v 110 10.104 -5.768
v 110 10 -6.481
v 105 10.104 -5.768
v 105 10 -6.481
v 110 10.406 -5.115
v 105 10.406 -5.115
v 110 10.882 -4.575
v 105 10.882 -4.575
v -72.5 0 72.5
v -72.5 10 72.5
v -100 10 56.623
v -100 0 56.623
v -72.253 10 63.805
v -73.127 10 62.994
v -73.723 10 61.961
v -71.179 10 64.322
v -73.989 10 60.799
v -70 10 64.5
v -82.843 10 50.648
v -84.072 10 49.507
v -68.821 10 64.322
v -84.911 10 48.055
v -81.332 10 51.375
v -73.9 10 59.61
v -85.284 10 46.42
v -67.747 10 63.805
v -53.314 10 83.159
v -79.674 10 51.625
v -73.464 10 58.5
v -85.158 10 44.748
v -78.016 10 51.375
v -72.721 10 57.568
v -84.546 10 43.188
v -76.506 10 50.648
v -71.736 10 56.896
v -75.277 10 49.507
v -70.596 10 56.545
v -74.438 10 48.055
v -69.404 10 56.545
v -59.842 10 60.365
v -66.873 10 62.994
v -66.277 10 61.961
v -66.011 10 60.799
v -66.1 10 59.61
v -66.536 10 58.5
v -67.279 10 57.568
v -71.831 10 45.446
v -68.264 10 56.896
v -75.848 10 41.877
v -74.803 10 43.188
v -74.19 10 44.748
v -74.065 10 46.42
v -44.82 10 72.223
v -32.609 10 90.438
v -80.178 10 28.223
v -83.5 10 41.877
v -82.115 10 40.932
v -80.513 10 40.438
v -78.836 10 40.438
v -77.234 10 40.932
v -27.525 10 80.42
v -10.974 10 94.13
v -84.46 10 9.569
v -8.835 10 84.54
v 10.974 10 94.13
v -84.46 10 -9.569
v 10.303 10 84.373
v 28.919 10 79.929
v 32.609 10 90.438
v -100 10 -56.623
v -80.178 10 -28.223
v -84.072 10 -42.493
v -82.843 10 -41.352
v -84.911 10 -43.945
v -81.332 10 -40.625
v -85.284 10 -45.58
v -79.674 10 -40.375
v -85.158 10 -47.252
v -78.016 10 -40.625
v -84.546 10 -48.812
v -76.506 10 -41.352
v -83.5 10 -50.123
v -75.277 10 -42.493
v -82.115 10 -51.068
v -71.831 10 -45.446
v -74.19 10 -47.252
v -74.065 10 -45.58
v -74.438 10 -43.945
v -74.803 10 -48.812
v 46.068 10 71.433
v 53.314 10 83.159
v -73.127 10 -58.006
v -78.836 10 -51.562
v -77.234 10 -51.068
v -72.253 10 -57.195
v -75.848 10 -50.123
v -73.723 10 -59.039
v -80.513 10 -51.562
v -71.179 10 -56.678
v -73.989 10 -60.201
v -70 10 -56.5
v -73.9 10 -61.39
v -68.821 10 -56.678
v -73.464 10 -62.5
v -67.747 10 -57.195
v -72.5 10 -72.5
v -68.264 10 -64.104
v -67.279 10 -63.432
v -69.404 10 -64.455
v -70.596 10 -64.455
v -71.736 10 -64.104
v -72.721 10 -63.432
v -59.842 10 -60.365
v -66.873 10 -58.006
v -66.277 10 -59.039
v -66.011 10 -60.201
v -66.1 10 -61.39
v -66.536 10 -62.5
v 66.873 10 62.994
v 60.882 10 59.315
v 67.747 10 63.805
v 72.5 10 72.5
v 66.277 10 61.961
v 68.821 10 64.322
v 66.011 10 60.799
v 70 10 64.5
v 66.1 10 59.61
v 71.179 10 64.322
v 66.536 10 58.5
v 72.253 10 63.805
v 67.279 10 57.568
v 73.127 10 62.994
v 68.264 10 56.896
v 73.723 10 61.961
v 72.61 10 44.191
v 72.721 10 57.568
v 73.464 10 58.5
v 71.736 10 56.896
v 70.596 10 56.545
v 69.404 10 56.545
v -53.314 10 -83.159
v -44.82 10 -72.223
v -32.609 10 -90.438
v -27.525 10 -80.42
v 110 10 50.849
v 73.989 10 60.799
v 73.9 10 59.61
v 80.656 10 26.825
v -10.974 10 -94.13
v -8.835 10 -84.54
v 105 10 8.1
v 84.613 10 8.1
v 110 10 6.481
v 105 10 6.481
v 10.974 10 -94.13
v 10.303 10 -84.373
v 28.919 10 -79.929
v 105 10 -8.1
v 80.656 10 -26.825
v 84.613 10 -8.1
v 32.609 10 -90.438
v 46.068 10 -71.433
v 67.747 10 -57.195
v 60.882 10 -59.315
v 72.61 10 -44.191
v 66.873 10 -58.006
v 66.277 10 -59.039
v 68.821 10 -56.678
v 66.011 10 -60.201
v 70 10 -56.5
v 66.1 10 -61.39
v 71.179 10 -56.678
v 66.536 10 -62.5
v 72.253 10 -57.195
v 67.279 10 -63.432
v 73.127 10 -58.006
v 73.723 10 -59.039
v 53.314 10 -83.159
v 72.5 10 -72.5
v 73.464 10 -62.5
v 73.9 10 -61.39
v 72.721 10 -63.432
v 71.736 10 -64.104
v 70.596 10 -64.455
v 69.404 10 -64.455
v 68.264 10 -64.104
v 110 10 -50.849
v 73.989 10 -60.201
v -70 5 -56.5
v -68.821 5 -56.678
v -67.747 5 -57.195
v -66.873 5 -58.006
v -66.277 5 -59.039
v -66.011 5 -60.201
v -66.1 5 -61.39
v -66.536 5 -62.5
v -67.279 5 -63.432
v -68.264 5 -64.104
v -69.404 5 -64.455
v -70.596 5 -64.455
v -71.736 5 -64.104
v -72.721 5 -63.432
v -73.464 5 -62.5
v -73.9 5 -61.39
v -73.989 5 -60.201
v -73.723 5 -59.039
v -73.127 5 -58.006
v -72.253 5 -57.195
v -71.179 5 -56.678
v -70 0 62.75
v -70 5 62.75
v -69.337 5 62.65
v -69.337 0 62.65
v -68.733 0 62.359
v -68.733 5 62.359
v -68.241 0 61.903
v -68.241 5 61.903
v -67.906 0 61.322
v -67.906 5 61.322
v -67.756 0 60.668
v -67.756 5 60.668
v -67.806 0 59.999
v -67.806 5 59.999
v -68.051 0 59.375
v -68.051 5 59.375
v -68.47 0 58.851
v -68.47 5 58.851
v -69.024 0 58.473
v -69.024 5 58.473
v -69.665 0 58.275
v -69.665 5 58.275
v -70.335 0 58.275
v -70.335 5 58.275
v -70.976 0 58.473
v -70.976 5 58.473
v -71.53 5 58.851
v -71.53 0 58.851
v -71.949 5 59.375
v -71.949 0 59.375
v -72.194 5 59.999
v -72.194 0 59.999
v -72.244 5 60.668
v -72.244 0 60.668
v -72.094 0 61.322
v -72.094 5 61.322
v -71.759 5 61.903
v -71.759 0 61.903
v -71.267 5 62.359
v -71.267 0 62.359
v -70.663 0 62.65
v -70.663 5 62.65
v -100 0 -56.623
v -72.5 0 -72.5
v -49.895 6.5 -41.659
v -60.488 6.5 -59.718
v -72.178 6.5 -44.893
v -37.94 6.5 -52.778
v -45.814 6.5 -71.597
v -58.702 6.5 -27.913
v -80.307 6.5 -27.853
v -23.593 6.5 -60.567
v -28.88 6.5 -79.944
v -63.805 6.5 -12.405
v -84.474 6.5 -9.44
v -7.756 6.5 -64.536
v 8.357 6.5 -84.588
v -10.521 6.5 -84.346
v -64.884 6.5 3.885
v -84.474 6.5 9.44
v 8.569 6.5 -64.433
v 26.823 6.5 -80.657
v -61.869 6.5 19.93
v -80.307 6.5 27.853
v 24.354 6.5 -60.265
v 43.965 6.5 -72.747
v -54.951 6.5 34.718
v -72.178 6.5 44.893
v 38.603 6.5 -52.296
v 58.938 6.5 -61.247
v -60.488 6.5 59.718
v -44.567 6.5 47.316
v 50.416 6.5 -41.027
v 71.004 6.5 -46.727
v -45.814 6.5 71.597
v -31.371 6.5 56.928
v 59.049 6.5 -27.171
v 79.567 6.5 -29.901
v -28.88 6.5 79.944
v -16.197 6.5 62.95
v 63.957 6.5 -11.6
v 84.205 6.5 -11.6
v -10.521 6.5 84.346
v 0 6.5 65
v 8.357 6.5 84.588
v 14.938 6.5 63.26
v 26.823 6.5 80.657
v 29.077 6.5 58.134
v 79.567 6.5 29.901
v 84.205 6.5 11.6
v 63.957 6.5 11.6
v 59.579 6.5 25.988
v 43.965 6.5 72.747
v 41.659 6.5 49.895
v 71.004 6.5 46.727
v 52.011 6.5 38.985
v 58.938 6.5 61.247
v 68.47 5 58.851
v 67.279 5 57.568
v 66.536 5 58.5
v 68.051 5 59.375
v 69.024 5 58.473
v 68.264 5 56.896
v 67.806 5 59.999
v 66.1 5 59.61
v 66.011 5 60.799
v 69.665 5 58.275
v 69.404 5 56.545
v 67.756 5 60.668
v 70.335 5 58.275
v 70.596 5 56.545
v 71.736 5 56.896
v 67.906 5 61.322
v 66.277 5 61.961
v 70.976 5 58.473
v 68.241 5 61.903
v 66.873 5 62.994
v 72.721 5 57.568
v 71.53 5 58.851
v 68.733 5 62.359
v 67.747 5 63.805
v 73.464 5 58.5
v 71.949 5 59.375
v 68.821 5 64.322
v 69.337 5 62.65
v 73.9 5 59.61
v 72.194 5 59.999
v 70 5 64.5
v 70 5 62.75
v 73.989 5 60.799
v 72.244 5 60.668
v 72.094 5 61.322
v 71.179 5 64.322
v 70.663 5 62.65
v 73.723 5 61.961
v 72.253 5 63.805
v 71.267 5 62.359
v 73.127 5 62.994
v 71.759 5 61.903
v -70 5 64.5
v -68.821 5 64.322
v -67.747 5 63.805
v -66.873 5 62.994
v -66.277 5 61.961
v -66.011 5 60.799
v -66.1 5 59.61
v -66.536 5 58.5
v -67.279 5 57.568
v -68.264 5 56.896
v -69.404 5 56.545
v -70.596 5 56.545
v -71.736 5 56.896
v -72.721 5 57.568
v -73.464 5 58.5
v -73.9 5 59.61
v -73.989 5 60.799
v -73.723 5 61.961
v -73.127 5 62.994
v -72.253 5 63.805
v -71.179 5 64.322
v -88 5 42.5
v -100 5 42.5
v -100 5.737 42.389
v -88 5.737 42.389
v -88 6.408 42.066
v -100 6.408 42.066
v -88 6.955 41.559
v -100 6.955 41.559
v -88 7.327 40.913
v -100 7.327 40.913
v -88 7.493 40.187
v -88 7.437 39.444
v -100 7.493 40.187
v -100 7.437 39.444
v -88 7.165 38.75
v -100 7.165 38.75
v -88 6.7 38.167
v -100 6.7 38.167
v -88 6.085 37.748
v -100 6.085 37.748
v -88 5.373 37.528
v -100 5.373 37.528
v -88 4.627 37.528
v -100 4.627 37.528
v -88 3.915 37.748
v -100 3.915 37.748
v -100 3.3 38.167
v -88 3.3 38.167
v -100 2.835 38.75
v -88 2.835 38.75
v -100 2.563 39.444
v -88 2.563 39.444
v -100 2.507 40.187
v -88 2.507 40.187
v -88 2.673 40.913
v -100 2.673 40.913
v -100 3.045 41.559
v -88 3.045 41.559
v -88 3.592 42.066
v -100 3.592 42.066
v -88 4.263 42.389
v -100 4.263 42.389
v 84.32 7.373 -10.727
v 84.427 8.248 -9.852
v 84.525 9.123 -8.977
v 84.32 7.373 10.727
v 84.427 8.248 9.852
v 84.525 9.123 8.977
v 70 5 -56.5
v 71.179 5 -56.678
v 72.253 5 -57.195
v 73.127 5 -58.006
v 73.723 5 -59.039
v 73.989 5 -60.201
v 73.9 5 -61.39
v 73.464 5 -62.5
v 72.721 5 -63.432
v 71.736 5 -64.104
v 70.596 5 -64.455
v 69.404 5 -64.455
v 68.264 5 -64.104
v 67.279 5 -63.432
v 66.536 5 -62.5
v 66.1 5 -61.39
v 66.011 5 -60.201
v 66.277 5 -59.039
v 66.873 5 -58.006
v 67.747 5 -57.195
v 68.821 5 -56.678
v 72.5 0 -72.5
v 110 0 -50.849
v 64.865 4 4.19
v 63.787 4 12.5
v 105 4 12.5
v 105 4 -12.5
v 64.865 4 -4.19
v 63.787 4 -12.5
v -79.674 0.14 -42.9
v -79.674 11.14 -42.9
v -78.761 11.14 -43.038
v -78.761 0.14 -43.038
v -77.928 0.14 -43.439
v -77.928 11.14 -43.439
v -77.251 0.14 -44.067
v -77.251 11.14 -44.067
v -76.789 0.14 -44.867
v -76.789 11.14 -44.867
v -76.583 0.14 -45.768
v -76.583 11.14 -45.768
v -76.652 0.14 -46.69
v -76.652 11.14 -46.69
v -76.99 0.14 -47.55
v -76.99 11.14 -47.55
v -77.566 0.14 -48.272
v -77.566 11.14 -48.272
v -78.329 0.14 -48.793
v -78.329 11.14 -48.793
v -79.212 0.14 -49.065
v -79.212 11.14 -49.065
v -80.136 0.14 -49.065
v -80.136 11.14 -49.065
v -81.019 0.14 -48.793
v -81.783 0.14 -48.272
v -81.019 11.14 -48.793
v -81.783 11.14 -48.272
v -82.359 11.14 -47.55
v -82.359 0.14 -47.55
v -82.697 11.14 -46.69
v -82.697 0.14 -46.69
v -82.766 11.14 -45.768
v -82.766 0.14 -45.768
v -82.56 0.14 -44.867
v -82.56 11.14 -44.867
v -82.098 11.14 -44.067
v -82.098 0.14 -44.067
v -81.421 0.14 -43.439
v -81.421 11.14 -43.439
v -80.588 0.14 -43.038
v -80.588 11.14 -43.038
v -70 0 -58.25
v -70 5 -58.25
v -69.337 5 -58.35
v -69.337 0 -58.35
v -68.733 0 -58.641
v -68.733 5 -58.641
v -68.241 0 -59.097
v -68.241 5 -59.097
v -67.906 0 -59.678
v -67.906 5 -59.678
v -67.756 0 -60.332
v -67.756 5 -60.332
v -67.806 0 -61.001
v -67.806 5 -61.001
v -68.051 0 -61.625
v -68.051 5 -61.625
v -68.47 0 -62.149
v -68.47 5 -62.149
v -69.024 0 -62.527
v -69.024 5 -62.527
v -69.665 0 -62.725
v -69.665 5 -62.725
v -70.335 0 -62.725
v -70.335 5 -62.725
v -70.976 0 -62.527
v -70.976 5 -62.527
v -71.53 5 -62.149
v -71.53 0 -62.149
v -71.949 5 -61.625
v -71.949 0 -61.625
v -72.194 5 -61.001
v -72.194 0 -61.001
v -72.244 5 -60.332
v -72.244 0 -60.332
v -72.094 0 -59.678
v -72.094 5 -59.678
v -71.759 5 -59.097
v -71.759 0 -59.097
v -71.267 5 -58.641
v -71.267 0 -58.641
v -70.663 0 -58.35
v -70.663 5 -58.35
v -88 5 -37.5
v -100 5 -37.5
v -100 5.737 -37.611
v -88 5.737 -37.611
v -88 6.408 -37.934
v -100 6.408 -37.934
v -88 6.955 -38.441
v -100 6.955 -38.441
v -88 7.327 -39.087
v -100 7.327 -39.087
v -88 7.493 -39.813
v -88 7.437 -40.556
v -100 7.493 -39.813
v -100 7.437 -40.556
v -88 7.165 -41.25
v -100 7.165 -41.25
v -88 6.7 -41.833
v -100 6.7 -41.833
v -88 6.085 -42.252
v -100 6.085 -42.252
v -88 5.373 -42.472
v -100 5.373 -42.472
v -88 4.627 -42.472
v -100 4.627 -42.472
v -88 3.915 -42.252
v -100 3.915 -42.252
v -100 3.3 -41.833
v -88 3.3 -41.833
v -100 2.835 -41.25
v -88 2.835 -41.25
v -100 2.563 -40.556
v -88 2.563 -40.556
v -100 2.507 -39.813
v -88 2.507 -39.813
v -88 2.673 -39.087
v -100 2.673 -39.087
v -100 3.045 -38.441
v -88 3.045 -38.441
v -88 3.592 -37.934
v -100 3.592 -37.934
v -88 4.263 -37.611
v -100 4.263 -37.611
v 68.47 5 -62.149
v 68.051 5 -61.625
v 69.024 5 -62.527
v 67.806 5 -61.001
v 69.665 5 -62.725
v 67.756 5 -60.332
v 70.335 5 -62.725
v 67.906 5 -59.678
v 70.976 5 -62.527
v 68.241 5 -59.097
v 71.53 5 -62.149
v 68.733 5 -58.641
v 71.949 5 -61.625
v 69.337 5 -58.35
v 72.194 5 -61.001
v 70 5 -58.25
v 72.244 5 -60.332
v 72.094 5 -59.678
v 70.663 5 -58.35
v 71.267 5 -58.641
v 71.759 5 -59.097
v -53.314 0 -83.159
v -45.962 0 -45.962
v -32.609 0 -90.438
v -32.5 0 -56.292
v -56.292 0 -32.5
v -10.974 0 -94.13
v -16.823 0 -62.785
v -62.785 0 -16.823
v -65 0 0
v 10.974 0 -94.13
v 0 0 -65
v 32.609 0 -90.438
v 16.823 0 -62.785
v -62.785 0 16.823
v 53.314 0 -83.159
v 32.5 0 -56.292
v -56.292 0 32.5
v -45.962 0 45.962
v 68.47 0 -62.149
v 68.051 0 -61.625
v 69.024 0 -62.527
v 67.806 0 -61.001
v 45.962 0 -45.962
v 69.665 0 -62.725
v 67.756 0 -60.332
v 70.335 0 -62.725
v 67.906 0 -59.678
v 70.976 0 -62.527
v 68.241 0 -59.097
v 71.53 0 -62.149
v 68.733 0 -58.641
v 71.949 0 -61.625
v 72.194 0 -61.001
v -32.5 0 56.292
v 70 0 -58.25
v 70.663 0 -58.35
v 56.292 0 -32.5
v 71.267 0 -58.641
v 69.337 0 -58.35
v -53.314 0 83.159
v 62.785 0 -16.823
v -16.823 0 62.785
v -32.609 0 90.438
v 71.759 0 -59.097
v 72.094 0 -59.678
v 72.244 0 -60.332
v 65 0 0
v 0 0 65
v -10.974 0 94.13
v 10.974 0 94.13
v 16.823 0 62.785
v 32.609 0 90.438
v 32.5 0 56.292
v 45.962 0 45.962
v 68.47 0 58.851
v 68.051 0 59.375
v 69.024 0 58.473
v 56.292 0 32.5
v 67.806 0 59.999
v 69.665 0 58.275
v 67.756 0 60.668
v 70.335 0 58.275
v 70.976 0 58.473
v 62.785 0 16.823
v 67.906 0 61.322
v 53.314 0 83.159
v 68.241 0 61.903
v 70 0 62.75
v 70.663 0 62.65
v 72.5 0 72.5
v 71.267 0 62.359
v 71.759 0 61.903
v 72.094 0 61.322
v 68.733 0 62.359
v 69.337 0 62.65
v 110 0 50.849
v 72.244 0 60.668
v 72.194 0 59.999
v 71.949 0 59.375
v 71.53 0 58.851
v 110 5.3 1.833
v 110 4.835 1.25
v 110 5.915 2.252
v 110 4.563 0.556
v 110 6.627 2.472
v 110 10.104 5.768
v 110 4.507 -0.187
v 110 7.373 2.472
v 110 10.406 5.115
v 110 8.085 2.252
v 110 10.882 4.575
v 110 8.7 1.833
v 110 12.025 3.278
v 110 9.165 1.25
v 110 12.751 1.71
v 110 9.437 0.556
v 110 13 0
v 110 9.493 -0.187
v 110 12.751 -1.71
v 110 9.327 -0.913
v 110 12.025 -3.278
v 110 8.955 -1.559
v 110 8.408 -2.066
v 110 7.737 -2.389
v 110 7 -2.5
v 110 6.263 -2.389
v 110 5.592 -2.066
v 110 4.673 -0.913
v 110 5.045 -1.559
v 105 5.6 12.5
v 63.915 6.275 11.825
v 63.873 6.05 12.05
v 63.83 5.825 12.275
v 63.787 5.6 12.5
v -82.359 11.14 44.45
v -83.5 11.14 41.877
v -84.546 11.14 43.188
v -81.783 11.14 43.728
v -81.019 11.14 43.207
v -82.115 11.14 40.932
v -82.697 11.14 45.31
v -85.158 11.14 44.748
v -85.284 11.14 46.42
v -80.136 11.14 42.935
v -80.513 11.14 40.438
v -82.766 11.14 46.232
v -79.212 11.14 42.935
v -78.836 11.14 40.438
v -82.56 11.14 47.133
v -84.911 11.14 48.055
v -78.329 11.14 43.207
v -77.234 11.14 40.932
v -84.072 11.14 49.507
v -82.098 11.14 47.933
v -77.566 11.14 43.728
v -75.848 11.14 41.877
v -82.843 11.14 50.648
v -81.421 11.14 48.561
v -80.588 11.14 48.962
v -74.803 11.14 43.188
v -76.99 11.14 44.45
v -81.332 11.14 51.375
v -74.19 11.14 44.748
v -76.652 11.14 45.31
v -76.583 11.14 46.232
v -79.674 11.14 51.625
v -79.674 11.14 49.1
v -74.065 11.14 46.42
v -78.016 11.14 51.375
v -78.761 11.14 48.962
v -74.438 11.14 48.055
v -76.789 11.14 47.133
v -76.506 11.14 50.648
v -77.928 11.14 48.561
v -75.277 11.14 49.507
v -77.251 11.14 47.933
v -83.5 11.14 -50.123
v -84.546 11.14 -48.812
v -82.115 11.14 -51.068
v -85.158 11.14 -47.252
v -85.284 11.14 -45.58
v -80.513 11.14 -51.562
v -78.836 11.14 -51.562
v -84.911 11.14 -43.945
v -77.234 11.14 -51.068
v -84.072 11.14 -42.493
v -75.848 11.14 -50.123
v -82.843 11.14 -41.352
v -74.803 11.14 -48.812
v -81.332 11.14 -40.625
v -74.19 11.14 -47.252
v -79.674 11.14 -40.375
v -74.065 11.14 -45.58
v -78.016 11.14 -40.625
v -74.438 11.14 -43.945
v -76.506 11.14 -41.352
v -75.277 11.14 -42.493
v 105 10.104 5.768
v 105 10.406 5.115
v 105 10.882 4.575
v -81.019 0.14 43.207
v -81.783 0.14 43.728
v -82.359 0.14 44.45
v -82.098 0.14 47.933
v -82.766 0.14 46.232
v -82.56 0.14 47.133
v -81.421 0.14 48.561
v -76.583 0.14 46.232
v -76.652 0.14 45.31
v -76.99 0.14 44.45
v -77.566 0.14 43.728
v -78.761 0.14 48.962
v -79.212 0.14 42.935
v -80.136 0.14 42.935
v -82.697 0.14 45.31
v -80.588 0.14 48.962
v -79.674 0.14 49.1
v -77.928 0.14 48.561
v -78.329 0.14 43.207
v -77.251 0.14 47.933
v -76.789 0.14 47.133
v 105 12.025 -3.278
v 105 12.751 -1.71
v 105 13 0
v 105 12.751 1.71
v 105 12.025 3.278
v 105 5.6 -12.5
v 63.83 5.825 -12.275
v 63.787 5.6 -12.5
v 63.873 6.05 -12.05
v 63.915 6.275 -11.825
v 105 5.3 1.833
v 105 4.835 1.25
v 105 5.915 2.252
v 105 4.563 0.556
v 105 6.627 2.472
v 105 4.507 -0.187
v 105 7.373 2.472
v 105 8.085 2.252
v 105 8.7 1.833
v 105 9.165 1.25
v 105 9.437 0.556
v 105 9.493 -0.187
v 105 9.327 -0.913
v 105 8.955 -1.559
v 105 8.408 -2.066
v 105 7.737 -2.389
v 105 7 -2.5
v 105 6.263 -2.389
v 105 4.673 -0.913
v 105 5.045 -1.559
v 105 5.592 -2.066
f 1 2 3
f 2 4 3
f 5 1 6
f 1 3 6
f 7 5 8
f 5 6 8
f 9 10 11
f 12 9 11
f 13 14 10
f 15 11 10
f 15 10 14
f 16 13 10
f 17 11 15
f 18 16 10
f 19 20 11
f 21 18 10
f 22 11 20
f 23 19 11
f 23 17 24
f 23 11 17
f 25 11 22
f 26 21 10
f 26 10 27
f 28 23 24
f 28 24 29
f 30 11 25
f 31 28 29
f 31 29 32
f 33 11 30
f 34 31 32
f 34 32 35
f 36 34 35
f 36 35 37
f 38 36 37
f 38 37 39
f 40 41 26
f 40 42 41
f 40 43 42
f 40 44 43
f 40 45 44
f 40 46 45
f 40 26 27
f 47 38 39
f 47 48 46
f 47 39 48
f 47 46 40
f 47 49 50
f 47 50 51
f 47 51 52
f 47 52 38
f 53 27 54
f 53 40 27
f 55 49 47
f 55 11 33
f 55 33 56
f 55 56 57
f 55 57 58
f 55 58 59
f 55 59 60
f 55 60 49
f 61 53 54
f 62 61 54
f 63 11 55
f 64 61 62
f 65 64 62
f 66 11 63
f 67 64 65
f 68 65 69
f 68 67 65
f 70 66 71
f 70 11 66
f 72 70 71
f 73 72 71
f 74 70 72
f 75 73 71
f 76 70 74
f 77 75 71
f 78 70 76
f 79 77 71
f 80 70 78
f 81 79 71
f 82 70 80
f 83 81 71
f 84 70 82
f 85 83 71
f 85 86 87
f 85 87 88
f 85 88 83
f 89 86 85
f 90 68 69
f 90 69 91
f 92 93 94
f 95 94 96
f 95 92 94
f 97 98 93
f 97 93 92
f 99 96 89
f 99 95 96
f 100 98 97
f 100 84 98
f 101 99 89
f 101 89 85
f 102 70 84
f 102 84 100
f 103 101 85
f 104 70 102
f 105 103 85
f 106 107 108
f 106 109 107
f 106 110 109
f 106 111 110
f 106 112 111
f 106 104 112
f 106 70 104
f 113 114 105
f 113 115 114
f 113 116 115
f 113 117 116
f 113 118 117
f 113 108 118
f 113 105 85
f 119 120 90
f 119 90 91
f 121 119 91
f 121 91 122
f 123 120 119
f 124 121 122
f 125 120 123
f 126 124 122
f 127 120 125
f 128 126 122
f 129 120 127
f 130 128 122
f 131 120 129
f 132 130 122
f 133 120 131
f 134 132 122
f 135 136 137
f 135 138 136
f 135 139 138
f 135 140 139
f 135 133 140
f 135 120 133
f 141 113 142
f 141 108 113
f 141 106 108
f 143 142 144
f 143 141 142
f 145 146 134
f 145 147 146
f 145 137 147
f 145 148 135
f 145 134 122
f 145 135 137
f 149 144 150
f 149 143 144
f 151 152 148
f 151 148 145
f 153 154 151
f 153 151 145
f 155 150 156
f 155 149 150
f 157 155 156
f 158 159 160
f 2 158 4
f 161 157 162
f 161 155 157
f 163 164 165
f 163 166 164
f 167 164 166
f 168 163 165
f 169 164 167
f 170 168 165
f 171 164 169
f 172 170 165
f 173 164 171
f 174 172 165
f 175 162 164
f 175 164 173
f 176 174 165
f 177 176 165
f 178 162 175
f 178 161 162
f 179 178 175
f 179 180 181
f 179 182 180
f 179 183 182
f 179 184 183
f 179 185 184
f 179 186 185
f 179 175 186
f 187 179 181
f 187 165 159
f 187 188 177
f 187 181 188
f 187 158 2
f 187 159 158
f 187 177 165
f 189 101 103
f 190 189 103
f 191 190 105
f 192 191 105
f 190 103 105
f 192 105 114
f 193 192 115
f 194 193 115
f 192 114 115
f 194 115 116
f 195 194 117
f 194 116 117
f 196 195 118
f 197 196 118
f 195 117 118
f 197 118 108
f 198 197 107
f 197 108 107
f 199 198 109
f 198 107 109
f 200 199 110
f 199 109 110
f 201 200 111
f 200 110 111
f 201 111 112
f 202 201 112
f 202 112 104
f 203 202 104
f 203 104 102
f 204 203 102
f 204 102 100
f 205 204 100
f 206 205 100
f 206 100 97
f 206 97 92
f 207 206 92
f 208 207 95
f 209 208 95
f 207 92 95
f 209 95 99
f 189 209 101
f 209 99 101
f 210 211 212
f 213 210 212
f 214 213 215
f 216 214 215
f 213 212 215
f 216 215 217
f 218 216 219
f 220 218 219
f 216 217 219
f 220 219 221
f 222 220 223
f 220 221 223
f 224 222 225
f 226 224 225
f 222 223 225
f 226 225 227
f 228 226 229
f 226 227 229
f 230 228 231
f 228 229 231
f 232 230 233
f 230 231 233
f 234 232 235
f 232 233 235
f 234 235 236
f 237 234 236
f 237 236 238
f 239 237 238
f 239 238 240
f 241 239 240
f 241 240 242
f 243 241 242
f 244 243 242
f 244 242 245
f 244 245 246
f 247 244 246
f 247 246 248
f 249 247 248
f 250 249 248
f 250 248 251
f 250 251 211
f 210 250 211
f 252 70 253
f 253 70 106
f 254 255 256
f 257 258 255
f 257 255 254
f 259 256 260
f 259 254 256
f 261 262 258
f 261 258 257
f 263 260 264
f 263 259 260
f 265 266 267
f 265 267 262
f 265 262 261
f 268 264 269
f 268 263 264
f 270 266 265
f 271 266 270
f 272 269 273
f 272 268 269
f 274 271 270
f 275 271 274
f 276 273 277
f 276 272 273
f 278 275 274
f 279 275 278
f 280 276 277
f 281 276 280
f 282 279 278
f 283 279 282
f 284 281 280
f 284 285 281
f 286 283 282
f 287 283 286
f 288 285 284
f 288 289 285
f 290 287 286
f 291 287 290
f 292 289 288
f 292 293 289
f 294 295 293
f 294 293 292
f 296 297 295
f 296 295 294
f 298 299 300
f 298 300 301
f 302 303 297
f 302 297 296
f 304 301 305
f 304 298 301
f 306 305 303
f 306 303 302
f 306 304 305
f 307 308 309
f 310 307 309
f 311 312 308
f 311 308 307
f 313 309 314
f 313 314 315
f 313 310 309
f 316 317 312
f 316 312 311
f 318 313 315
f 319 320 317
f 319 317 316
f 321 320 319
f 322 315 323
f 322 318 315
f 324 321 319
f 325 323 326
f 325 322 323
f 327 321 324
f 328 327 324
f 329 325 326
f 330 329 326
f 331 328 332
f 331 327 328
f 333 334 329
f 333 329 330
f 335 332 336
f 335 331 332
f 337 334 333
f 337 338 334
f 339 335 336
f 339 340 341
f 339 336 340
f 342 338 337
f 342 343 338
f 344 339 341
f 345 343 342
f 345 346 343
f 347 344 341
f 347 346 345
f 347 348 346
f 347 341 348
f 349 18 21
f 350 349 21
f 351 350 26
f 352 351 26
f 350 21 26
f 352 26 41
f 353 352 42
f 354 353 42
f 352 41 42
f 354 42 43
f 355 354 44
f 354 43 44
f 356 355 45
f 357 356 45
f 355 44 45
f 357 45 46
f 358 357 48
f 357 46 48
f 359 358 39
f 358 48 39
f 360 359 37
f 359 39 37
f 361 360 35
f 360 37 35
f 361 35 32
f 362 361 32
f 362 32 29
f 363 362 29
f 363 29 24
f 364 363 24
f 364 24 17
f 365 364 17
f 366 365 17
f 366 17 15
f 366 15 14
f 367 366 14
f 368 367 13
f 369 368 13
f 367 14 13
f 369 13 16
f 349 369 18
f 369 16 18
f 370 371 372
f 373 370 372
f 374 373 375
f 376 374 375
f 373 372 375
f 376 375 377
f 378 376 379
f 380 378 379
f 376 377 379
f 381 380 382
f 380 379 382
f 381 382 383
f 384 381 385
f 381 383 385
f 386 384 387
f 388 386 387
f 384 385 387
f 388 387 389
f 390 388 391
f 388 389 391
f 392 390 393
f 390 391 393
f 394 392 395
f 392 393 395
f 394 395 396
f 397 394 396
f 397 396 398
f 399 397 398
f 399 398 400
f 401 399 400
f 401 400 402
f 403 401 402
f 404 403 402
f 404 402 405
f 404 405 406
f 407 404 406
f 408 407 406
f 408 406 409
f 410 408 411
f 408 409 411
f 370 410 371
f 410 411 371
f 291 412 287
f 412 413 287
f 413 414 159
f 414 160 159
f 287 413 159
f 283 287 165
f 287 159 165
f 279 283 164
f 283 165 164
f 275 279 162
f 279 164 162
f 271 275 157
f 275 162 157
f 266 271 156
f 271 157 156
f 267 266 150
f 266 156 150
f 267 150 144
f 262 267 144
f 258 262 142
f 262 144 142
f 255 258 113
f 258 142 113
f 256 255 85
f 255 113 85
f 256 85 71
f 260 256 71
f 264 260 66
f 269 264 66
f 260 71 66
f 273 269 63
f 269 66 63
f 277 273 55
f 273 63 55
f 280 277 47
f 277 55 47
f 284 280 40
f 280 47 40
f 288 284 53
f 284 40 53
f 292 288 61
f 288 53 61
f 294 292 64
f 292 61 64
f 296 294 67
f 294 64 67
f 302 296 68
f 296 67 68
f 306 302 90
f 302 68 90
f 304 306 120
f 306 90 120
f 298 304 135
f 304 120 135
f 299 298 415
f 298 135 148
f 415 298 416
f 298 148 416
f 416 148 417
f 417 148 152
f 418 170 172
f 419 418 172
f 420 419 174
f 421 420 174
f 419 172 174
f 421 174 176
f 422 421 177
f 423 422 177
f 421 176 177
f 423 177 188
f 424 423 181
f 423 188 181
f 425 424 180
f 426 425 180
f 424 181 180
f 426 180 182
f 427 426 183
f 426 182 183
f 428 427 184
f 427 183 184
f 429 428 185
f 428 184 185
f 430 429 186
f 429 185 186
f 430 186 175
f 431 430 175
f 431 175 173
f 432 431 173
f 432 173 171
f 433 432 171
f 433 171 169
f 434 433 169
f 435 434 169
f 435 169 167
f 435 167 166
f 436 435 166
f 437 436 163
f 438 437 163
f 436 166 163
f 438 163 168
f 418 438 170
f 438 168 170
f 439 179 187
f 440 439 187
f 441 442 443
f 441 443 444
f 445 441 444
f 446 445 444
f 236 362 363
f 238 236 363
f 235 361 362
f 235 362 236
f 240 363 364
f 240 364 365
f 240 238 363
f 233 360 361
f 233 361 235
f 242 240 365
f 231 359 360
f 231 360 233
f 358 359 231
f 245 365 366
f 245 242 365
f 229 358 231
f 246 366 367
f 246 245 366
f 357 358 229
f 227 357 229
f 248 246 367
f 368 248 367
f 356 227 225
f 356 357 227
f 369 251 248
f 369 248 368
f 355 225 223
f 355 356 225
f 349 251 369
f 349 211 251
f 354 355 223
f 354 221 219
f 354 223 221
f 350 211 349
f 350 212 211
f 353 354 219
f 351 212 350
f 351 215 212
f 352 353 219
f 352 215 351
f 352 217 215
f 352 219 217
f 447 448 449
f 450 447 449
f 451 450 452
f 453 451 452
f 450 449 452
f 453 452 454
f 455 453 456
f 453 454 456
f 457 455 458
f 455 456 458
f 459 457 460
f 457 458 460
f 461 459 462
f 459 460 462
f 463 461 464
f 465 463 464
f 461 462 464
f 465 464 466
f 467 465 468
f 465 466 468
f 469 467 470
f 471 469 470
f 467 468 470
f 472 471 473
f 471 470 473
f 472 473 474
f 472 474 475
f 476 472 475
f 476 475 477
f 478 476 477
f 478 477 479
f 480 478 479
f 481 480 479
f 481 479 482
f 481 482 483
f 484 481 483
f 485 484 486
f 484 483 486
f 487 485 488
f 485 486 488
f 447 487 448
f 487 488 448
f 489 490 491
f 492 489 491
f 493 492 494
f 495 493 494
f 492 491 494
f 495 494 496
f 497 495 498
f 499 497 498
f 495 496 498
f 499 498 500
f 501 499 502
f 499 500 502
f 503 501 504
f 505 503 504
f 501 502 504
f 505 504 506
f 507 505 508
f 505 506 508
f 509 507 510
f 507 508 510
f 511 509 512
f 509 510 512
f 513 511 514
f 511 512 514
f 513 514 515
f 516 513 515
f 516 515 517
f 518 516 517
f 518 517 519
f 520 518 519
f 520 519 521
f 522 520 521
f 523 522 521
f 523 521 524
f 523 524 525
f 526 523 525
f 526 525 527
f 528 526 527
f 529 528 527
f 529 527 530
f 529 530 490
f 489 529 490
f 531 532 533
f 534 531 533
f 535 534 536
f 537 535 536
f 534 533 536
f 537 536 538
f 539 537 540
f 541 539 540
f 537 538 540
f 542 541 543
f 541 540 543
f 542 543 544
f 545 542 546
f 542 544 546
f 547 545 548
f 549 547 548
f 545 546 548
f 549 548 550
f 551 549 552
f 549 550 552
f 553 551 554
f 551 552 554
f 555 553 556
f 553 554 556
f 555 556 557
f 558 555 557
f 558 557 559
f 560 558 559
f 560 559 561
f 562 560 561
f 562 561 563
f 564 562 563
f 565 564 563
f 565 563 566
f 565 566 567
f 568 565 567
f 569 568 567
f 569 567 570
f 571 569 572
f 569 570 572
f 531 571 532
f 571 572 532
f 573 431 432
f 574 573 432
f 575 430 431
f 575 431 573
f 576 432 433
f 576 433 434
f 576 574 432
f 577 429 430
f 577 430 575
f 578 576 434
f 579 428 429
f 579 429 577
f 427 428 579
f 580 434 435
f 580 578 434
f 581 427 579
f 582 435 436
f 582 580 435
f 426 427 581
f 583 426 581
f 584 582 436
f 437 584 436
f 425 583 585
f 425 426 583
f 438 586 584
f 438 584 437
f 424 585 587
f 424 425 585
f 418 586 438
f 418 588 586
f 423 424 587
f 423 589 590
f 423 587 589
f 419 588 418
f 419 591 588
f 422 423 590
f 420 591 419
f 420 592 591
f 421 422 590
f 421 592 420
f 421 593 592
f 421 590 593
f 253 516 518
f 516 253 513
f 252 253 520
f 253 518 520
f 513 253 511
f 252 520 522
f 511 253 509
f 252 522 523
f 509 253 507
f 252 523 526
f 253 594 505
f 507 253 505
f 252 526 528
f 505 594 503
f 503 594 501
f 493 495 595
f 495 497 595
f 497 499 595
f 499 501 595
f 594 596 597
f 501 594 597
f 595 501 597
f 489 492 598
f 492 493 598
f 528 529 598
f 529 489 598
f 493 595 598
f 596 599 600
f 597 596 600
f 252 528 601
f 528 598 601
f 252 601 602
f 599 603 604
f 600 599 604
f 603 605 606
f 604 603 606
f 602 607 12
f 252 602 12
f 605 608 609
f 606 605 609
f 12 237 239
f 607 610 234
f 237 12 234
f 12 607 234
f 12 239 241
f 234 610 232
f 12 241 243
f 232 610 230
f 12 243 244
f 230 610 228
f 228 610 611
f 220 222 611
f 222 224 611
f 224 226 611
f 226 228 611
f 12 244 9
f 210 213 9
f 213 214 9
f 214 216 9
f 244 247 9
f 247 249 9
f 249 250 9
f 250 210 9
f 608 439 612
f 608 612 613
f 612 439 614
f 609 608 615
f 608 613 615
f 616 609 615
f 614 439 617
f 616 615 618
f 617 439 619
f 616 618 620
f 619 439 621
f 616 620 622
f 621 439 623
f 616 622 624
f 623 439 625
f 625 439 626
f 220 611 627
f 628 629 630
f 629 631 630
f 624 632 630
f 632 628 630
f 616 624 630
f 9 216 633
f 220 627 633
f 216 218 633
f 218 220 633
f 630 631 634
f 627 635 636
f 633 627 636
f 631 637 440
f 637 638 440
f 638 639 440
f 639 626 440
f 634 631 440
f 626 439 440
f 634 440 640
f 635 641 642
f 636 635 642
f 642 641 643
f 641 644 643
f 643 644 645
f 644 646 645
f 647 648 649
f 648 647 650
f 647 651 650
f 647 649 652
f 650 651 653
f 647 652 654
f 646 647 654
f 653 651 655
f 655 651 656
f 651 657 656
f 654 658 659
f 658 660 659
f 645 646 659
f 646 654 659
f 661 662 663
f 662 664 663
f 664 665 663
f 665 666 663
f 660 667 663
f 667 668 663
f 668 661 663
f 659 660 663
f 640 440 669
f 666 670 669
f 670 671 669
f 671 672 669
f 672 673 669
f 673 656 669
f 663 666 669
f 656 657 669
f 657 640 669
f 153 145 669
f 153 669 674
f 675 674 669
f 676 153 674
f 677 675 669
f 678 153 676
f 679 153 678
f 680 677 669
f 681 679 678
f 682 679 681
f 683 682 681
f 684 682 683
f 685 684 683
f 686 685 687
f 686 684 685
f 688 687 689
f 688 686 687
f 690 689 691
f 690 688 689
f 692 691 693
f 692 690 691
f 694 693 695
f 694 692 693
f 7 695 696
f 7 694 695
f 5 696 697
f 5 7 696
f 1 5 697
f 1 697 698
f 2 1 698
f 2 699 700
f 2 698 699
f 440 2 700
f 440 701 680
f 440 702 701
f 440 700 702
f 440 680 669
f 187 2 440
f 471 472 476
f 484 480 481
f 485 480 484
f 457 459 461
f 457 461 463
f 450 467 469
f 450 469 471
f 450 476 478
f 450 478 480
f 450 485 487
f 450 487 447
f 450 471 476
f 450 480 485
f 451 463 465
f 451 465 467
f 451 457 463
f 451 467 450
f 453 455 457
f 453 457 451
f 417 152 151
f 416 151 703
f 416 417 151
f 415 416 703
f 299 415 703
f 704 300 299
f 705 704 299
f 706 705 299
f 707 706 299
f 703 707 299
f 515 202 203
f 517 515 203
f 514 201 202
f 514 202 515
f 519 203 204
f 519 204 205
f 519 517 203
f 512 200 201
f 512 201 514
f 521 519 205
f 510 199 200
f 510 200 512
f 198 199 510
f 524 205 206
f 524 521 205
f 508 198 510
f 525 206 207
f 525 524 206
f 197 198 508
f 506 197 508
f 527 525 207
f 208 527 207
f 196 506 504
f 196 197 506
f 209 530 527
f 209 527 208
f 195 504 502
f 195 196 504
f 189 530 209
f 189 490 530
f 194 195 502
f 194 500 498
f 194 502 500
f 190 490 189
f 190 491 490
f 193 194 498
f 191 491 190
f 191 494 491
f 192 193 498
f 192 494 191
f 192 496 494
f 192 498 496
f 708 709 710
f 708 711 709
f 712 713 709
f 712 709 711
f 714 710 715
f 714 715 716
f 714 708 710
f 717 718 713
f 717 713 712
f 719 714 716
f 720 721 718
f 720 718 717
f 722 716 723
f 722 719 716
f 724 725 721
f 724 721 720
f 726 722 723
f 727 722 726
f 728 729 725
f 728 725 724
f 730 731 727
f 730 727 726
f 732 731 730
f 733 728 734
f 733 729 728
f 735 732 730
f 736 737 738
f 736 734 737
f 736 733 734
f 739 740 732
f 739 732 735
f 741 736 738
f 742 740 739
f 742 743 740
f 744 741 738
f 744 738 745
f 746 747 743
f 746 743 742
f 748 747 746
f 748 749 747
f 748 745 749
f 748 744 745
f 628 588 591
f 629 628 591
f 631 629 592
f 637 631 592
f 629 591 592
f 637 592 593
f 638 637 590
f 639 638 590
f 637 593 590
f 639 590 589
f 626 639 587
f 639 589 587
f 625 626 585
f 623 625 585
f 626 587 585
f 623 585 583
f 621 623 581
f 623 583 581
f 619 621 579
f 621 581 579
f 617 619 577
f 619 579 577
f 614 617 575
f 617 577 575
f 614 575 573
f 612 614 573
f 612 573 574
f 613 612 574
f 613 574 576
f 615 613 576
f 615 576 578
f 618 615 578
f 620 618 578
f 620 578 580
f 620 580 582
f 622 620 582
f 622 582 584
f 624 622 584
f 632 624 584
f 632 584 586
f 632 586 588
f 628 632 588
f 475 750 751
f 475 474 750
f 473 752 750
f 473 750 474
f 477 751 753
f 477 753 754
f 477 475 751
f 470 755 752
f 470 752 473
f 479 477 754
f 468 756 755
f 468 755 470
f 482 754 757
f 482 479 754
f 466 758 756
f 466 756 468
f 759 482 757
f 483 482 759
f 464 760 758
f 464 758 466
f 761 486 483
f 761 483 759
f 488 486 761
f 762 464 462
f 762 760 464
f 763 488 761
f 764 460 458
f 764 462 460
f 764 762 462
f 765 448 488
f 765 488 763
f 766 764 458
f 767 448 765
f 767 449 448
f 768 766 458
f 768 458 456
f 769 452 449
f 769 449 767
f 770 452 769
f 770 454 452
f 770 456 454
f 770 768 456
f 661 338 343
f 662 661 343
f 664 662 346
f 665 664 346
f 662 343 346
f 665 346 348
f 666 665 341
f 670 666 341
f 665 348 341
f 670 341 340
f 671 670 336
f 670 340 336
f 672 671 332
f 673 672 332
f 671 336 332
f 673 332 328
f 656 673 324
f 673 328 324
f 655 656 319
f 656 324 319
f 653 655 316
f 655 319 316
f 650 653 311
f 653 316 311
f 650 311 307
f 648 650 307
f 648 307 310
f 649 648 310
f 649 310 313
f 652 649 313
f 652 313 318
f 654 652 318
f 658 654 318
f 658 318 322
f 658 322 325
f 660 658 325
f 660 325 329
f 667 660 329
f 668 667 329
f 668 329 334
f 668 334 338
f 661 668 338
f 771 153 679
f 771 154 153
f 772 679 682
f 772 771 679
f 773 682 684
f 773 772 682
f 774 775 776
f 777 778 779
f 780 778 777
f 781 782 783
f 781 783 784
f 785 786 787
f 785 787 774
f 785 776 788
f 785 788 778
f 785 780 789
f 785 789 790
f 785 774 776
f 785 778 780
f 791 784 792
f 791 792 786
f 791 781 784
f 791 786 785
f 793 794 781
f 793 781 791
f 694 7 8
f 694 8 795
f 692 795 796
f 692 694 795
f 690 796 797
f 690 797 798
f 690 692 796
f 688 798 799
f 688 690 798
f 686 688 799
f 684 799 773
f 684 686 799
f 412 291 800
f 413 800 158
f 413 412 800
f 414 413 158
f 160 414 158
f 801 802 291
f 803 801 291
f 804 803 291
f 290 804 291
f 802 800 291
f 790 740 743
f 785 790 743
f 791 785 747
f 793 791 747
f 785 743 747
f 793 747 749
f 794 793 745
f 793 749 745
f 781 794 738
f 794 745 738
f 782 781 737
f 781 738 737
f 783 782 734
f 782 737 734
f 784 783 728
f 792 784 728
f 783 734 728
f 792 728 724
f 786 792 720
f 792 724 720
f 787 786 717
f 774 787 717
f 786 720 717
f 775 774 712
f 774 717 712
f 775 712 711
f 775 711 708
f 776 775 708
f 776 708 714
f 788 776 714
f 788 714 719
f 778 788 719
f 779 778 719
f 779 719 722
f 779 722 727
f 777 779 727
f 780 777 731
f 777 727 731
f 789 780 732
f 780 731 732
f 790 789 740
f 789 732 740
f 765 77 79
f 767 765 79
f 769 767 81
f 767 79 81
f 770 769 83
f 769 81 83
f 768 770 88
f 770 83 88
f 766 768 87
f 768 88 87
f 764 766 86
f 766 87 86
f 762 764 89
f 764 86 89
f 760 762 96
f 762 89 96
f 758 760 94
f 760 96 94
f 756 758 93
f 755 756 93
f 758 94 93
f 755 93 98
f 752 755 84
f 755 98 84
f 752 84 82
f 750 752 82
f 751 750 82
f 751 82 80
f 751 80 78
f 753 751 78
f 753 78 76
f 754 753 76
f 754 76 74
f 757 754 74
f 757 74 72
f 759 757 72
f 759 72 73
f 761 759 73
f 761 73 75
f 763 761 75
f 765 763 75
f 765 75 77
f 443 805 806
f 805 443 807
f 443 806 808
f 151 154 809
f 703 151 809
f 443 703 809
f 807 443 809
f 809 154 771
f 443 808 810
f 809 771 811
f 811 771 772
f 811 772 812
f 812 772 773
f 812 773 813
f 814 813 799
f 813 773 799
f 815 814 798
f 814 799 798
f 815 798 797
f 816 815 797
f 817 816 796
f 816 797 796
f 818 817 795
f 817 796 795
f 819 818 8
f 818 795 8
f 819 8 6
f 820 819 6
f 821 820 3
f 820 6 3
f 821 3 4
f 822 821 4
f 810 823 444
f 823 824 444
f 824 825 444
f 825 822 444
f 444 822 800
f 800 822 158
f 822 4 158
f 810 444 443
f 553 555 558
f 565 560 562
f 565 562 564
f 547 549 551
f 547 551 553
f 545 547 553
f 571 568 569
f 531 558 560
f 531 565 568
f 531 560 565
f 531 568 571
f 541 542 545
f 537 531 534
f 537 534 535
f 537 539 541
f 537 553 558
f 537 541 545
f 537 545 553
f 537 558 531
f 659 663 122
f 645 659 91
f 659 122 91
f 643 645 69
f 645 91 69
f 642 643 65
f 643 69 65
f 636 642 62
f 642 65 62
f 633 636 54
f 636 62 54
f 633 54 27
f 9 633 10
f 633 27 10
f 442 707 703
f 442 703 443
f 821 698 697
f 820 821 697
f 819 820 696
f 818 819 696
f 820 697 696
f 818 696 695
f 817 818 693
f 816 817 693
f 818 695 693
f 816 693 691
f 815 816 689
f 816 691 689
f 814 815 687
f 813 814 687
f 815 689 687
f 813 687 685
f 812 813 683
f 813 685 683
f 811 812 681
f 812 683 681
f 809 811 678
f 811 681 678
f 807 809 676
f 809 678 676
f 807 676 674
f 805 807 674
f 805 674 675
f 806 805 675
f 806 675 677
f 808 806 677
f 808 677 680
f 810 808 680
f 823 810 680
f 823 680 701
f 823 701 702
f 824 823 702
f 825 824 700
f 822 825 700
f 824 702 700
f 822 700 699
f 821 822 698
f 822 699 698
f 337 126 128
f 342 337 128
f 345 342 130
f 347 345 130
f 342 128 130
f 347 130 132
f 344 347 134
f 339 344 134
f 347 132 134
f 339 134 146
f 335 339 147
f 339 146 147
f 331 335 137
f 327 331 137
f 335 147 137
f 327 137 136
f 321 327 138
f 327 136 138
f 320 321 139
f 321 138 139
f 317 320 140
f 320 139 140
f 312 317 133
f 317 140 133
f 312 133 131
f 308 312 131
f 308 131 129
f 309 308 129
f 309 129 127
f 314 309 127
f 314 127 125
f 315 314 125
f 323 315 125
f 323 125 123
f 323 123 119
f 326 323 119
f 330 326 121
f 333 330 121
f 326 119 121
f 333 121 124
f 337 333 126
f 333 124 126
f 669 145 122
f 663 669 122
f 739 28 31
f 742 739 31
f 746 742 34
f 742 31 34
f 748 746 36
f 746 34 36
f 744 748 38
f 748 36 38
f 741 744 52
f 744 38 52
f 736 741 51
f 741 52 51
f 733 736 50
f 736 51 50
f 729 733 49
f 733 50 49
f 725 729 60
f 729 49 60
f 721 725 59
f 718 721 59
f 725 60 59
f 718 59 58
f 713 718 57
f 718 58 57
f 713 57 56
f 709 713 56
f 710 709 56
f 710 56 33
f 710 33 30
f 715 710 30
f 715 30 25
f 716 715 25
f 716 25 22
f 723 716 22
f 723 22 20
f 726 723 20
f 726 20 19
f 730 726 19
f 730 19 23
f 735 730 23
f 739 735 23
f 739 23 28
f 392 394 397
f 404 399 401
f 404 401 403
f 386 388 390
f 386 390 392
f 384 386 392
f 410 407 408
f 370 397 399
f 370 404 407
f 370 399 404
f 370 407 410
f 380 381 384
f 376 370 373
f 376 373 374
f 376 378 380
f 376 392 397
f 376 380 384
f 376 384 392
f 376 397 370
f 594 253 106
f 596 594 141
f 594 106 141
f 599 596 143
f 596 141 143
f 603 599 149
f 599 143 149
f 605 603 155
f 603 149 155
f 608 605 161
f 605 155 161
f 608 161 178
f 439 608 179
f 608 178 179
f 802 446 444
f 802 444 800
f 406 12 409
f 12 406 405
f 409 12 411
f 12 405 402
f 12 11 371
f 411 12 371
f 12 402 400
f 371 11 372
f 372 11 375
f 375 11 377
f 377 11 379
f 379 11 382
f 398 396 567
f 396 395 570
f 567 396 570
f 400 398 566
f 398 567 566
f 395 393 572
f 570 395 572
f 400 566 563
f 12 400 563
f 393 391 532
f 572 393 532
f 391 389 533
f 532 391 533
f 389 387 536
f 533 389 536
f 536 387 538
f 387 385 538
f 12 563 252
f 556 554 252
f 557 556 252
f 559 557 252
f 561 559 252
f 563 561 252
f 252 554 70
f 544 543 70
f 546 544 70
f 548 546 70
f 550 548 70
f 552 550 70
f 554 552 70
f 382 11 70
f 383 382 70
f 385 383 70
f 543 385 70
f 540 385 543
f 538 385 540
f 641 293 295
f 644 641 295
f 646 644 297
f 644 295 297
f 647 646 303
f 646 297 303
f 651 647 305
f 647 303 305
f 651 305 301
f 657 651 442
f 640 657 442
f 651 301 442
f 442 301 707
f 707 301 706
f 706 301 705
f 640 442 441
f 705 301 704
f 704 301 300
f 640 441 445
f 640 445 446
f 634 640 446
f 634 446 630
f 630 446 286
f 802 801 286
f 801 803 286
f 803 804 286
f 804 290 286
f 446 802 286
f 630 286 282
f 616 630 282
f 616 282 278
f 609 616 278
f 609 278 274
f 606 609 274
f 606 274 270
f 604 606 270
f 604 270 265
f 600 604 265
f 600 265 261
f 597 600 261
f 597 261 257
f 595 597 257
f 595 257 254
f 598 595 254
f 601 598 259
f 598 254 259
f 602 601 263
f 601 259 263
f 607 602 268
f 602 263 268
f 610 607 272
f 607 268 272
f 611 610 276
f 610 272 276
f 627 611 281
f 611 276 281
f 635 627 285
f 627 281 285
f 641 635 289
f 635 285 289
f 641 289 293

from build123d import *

# Parameters (mm, degrees)
SKETCH1_W                = 220
SKETCH1_H                = 210
BOSS_EXTRUDE1_DEPTH      = 10
SKETCH2_R                = 65
CUT_EXTRUDE1_DEPTH       = 153.397506541
SKETCH3_R                = 2.25
CUT_EXTRUDE2_DEPTH       = 153.397506541
SKETCH4_R                = 85
CUT_EXTRUDE3_DEPTH       = 3.5
SKETCH5_R                = 4
CUT_EXTRUDE4_DEPTH       = 5
BOSS_EXTRUDE2_DEPTH      = 1.14
BOSS_EXTRUDE2_DEPTH_BACK = 10
SKETCH6_R                = 5.625
CUT_EXTRUDE6_DEPTH       = 153.397506541
CUT_EXTRUDE5_DEPTH       = 146.506305169
SKETCH9_R                = 3.1
CUT_EXTRUDE7_DEPTH       = 11
BOSS_EXTRUDE3_REACH      = 147.423
SKETCH10_W               = 5
SKETCH10_H               = 46.83031672
SKETCH11_R               = 2.5
CUT_EXTRUDE8_DEPTH       = 5
SKETCH12_W               = 64.109170113
SKETCH12_H               = 200.868418625
CUT_EXTRUDE9_DEPTH       = 146.423468683
SKETCH13_R               = 2.5
CUT_EXTRUDE10_DEPTH      = 12
BOSS_EXTRUDE4_DEPTH      = 5
FILLET1_R                = 2.5


with BuildPart() as part:
    # Sketch1 → Boss-Extrude1 (new body)
    with BuildSketch(Plane(origin=(0, 0, 0), x_dir=(1, 0, 0), z_dir=(0, 1, 0))):
        Rectangle(SKETCH1_W, SKETCH1_H)
    extrude(amount=BOSS_EXTRUDE1_DEPTH)

    # Sketch2 → Cut-Extrude1 (cut, through all)
    with BuildSketch(Plane(origin=(0, 10, 0), x_dir=(1, 0, 0), z_dir=(0, 1, 0))):
        with Locations(Location((0, 0, 0), (0, 0, 270))):
            Circle(SKETCH2_R)
    extrude(amount=-CUT_EXTRUDE1_DEPTH, mode=Mode.SUBTRACT)

    # Sketch3 → Cut-Extrude2 (cut, through all)
    with BuildSketch(Plane(origin=(0, 10, 0), x_dir=(1, 0, 0), z_dir=(0, 1, 0))):
        with Locations(Location((70, 60.5, 0), (0, 0, 270))):
            Circle(SKETCH3_R)
        with Locations(Location((-70, 60.5, 0), (0, 0, 270))):
            Circle(SKETCH3_R)
        with Locations(Location((-70, -60.5, 0), (0, 0, 270))):
            Circle(SKETCH3_R)
        with Locations(Location((70, -60.5, 0), (0, 0, 270))):
            Circle(SKETCH3_R)
    extrude(amount=-CUT_EXTRUDE2_DEPTH, mode=Mode.SUBTRACT)

    # Sketch4 → Cut-Extrude3 (cut)
    with BuildSketch(Plane(origin=(0, 10, 0), x_dir=(1, 0, 0), z_dir=(0, 1, 0))):
        with Locations(Location((0, 0, 0), (0, 0, 270))):
            Circle(SKETCH4_R)
    extrude(amount=-CUT_EXTRUDE3_DEPTH, mode=Mode.SUBTRACT)

    # Sketch5 → Cut-Extrude4 (cut)
    with BuildSketch(Plane(origin=(0, 10, 0), x_dir=(1, 0, 0), z_dir=(0, 1, 0))):
        with Locations(Location((70, -60.5, 0), (0, 0, 270))):
            Circle(SKETCH5_R)
        with Locations(Location((-70, -60.5, 0), (0, 0, 270))):
            Circle(SKETCH5_R)
        with Locations(Location((-70, 60.5, 0), (0, 0, 270))):
            Circle(SKETCH5_R)
        with Locations(Location((70, 60.5, 0), (0, 0, 270))):
            Circle(SKETCH5_R)
    extrude(amount=-CUT_EXTRUDE4_DEPTH, mode=Mode.SUBTRACT)

    # Sketch6 → Boss-Extrude2 (add, two sides: drawn at the far end of the back side and taken through both)
    with BuildSketch(Plane(origin=(0, 10, 0), x_dir=(1, 0, 0), z_dir=(0, 1, 0)).offset(-BOSS_EXTRUDE2_DEPTH_BACK)):
        with Locations(Location((-79.674337148, 46, 0), (0, 0, 270))):
            Circle(SKETCH6_R)
        with Locations(Location((-79.674337148, -46, 0), (0, 0, 270))):
            Circle(SKETCH6_R)
    extrude(amount=BOSS_EXTRUDE2_DEPTH + BOSS_EXTRUDE2_DEPTH_BACK)

    # Sketch8 → Cut-Extrude6 (cut, through all)
    with BuildSketch(Plane(origin=(0, 10, 0), x_dir=(1, 0, 0), z_dir=(0, 1, 0))):
        with BuildLine():
            Line((-72.5, -72.5), (-110, -50.849364905))
            Line((-110, -50.849364905), (-110, -105))
            Line((-110, -105), (110, -105))
            Line((110, -105), (110, -50.849364905))
            Line((110, -50.849364905), (72.5, -72.5))
            ThreePointArc((72.5, -72.5), (0, -94.593790725), (-72.5, -72.5))
        make_face()
        with BuildLine():
            Line((-110, 50.849364905), (-72.5, 72.5))
            ThreePointArc((-72.5, 72.5), (0, 94.593790725), (72.5, 72.5))
            Line((72.5, 72.5), (110, 50.849364905))
            Line((110, 50.849364905), (110, 105))
            Line((110, 105), (-110, 105))
            Line((-110, 105), (-110, 50.849364905))
        make_face()
    extrude(amount=-CUT_EXTRUDE6_DEPTH, mode=Mode.SUBTRACT)

    # Sketch7 → Cut-Extrude5 (cut, through all)
    with BuildSketch(Plane(origin=(0, 0, 0), x_dir=(0, 0, -1), z_dir=(1, 0, 0))):
        Polygon((-12.5, 4), (12.5, 4), (12.5, 5.6), (8.1, 10), (-8.1, 10), (-12.5, 5.6), align=None)
    extrude(amount=CUT_EXTRUDE5_DEPTH, mode=Mode.SUBTRACT)

    # Sketch9 → Cut-Extrude7 (cut)
    with BuildSketch(Plane(origin=(0, 11.14, 0), x_dir=(1, 0, 0), z_dir=(0, 1, 0))):
        with Locations(Location((-79.674337148, 46, 0), (0, 0, 270))):
            Circle(SKETCH9_R)
        with Locations(Location((-79.674337148, -46, 0), (0, 0, 270))):
            Circle(SKETCH9_R)
    extrude(amount=-CUT_EXTRUDE7_DEPTH, mode=Mode.SUBTRACT)

    # Sketch10 → Boss-Extrude3 (add, up to next)
    with BuildSketch(Plane(origin=(0, 10, 0), x_dir=(1, 0, 0), z_dir=(0, 1, 0)), mode=Mode.PRIVATE) as boss_extrude3_sk1:
        with Locations((107.5, 0)):
            Rectangle(SKETCH10_W, SKETCH10_H)
    boss_extrude3_tool1 = extrude(boss_extrude3_sk1.sketch, amount=-BOSS_EXTRUDE3_REACH, mode=Mode.PRIVATE) - part.part
    add(boss_extrude3_tool1.solids().sort_by_distance((107.5, 10, 0))[0])

    # Sketch11 → Cut-Extrude8 (cut)
    with BuildSketch(Plane(origin=(110, 0, 0), x_dir=(0, 0, -1), z_dir=(1, 0, 0))):
        with Locations((0, 7)):
            Circle(SKETCH11_R)
    extrude(amount=-CUT_EXTRUDE8_DEPTH, mode=Mode.SUBTRACT)

    # Sketch12 → Cut-Extrude9 (cut, through all)
    with BuildSketch(Plane(origin=(0, 10, 0), x_dir=(1, 0, 0), z_dir=(0, 1, 0))):
        with Locations((-132.054585057, 3.279044808)):
            Rectangle(SKETCH12_W, SKETCH12_H)
    extrude(amount=-CUT_EXTRUDE9_DEPTH, mode=Mode.SUBTRACT)

    # Sketch13 → Cut-Extrude10 (cut)
    with BuildSketch(Plane.ZY.offset(100)):
        with Locations((-40, 5)):
            Circle(SKETCH13_R)
        with Locations((40, 5)):
            Circle(SKETCH13_R)
    extrude(amount=-CUT_EXTRUDE10_DEPTH, mode=Mode.SUBTRACT)

    # Sketch14 → Boss-Extrude4 (add)
    with BuildSketch(Plane(origin=(110, 0, 0), x_dir=(0, 0, -1), z_dir=(1, 0, 0))):
        with BuildLine():
            Line((-5.196152423, 10), (5.196152423, 10))
            ThreePointArc((5.196152423, 10), (0, 13), (-5.196152423, 10))
        make_face()
    extrude(amount=-BOSS_EXTRUDE4_DEPTH)

    # Fillet1
    fillet1_edges = [part.edges().sort_by_distance(p)[0] for p in [
        (107.5, 10, -5.196152423),
        (107.5, 10, 5.196152423),
    ]]
    fillet(fillet1_edges, radius=FILLET1_R)


solid = part.part
